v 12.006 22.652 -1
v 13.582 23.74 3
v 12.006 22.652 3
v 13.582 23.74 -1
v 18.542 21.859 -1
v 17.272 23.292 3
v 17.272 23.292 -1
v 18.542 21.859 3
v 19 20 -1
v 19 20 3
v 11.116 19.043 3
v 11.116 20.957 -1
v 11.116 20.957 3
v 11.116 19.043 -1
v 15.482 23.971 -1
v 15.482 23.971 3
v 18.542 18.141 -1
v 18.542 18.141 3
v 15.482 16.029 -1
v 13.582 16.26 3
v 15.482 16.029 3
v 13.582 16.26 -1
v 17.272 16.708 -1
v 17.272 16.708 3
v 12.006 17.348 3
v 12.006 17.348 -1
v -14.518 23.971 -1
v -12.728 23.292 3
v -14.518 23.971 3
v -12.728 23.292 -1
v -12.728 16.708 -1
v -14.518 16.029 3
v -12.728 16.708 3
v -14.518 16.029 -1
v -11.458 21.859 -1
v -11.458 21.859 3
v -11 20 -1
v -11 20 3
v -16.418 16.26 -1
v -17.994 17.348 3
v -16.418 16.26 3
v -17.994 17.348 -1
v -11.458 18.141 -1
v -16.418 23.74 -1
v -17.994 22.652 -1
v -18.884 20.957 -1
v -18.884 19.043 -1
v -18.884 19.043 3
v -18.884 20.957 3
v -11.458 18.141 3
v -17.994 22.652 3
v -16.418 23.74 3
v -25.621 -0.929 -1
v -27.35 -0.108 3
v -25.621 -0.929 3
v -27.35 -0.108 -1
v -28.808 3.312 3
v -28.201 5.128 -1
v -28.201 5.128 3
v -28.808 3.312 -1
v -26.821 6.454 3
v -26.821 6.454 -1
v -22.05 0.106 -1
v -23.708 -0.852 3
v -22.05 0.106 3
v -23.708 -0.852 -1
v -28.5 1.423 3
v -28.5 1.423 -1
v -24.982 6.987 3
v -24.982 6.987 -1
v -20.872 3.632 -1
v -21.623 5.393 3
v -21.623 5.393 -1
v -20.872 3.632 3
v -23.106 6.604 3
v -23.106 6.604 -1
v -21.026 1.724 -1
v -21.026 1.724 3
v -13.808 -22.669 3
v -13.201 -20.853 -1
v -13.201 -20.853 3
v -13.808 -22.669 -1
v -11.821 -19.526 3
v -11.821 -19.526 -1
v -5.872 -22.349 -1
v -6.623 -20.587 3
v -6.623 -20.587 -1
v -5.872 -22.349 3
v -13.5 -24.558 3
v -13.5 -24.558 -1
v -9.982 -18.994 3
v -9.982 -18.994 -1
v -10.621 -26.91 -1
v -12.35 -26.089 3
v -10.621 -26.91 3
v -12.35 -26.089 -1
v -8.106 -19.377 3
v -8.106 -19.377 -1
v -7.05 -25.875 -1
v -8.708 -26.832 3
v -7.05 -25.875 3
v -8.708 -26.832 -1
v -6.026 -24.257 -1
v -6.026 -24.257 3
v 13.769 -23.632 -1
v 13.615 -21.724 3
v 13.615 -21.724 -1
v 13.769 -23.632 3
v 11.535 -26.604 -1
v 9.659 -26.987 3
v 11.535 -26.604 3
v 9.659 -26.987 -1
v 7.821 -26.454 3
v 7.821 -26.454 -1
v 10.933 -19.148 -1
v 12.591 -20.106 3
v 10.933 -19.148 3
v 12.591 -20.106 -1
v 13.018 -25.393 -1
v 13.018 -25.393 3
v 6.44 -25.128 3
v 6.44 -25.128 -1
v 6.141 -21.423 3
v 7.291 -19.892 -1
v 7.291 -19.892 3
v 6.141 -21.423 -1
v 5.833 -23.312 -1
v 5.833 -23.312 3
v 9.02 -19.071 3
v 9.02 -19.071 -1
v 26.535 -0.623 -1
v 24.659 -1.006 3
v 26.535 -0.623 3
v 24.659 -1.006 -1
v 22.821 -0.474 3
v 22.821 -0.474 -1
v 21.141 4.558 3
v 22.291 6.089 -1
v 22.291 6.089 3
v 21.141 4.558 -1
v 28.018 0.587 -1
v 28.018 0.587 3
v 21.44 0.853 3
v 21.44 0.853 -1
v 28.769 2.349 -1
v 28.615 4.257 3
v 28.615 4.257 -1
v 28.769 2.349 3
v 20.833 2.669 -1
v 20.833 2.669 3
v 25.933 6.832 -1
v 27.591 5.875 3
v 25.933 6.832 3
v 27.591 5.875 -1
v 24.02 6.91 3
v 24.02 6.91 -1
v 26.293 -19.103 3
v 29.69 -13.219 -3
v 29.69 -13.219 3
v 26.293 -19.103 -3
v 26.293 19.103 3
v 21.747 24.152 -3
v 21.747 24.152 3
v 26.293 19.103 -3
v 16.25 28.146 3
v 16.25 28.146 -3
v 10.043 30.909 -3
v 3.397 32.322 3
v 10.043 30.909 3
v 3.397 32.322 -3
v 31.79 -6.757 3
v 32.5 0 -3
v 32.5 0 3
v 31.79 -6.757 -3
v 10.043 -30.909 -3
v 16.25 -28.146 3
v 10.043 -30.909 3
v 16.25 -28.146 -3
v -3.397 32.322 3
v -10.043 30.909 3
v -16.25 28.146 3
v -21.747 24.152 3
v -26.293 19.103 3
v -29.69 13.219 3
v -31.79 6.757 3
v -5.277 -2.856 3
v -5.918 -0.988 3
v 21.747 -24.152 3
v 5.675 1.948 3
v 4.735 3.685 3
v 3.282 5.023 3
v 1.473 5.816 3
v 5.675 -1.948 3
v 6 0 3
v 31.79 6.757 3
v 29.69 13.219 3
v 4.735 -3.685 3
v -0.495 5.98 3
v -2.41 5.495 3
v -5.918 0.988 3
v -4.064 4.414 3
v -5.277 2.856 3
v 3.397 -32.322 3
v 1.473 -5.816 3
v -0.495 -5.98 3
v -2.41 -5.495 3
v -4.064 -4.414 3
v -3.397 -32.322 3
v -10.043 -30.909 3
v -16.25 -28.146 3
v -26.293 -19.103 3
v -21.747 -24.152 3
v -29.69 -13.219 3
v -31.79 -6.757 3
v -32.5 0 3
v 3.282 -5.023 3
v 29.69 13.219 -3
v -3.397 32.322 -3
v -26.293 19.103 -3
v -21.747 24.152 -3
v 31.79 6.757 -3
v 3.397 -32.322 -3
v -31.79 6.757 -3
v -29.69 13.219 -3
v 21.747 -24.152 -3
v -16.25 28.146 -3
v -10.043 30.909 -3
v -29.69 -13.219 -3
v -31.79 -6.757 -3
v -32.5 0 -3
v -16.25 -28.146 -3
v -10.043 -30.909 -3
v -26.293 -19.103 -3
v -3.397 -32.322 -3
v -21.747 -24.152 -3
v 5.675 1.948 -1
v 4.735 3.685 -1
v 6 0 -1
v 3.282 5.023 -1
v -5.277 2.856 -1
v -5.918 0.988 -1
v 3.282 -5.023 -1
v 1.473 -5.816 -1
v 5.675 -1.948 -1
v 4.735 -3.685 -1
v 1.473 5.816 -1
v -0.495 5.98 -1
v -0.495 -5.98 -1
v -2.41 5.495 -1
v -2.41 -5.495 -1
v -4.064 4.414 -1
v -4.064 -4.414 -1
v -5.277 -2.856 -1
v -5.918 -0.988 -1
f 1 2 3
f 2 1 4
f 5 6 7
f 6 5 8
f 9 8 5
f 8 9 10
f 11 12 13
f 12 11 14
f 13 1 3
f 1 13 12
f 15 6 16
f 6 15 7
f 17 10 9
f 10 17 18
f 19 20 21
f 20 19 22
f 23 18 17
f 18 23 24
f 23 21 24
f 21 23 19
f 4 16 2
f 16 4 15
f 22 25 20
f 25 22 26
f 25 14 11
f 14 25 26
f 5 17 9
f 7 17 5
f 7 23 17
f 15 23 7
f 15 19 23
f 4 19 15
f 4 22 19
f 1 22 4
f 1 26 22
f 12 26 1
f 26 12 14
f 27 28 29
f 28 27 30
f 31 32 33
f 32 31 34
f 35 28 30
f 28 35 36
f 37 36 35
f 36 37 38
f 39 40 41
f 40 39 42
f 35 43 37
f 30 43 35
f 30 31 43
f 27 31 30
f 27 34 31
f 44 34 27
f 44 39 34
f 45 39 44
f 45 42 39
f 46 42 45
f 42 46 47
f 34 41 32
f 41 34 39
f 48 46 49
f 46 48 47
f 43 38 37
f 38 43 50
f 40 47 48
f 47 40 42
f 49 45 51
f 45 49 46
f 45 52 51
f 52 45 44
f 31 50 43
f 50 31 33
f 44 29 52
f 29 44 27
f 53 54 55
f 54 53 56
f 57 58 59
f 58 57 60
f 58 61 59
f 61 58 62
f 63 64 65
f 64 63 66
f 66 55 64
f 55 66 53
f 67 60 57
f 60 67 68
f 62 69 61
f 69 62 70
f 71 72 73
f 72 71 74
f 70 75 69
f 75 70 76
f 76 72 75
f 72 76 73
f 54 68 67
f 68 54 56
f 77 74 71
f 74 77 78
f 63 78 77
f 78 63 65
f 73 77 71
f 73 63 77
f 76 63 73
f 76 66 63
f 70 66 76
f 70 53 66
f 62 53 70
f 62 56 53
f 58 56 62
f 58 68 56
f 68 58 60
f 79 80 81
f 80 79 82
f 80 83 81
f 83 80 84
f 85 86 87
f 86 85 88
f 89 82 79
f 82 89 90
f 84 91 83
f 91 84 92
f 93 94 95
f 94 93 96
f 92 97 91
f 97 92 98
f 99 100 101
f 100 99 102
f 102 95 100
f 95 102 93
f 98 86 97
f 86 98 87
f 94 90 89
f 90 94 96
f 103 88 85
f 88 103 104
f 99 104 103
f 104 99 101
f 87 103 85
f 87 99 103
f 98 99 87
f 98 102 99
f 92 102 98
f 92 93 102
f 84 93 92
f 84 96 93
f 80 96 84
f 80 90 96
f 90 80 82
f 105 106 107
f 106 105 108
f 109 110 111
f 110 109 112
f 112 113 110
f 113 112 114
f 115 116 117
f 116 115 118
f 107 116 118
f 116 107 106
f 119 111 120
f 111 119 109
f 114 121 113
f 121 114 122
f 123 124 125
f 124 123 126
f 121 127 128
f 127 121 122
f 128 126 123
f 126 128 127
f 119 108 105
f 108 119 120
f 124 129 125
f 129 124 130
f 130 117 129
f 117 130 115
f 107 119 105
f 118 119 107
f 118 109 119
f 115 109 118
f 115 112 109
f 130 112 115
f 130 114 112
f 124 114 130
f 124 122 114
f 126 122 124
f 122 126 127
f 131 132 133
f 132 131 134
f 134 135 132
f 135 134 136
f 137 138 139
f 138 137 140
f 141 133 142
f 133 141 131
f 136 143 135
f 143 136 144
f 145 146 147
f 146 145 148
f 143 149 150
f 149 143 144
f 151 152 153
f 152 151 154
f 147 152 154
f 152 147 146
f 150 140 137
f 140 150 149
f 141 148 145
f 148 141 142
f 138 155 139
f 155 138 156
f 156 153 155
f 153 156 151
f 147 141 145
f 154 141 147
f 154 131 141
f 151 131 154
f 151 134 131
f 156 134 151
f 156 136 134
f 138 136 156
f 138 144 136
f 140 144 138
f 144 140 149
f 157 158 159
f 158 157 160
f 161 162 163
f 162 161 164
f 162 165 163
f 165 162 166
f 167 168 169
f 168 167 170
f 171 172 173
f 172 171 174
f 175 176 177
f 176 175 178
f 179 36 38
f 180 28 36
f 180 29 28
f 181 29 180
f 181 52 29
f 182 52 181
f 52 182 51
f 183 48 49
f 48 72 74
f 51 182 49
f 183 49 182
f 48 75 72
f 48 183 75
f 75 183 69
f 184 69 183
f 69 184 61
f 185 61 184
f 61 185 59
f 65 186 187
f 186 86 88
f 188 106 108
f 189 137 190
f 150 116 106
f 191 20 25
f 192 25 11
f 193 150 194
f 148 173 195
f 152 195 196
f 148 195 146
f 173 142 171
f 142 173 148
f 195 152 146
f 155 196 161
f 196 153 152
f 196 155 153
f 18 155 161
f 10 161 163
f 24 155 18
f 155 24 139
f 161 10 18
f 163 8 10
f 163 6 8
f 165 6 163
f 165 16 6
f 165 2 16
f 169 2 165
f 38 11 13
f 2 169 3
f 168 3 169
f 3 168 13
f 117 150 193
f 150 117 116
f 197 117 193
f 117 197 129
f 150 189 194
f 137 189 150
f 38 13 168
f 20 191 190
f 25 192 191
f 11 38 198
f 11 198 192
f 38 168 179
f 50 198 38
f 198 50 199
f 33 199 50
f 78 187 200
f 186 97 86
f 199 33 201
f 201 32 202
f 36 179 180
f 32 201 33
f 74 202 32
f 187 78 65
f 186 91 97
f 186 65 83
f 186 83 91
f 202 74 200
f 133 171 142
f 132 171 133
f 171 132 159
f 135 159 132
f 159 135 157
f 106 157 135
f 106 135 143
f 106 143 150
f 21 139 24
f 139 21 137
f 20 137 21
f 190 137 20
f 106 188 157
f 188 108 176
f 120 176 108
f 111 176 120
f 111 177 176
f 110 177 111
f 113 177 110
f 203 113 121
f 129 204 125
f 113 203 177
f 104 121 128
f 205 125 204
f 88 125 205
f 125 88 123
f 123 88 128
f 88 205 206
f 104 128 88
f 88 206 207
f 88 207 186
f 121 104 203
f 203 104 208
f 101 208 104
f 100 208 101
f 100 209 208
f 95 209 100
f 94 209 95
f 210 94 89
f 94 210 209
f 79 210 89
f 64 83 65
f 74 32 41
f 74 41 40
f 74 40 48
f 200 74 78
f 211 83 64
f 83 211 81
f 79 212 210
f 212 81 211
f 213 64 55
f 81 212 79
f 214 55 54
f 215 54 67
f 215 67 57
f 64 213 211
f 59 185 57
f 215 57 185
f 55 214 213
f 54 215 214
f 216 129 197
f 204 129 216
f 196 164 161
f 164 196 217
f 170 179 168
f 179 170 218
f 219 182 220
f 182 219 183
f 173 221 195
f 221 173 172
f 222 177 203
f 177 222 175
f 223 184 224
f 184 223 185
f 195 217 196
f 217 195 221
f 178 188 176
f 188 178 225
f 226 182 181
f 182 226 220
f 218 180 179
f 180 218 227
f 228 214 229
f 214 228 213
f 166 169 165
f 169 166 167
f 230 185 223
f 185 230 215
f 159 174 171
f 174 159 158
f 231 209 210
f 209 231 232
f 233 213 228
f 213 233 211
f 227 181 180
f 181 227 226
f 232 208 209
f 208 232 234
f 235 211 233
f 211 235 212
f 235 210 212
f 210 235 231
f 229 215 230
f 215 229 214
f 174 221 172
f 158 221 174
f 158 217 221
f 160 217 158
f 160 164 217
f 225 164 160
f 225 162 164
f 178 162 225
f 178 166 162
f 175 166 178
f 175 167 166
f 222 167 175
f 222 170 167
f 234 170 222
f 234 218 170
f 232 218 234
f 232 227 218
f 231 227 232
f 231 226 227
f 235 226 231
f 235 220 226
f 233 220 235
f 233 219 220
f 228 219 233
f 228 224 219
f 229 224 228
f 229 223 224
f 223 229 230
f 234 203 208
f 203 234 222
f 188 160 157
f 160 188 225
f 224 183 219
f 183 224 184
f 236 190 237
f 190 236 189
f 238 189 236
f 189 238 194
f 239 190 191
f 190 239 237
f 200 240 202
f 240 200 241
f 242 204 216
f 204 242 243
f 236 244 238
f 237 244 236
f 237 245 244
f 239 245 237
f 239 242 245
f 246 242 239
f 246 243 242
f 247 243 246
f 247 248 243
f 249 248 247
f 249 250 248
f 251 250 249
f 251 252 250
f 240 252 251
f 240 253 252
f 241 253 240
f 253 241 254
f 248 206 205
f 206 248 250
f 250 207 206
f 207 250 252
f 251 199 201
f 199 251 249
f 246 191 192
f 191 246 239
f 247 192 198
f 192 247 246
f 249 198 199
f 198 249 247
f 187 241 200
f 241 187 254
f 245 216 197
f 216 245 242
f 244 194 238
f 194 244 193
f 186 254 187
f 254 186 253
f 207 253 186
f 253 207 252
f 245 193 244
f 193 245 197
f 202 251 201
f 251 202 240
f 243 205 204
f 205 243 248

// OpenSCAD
center_hole_diameter = 12;
bolt_diameter = 8;
material_thickness=6;
parallelogram_width=30;
distance_from_center=-20;


module bolt_pair() {
	translate([parallelogram_width/2,-distance_from_center,-1])
		cylinder(d=bolt_diameter,h=material_thickness+2);
	translate([-parallelogram_width/2,-distance_from_center,-1])
		cylinder(d=bolt_diameter,h=material_thickness+2);

}

module bolt_triangle() {
	bolt_pair();
	rotate(120)
		bolt_pair();
	rotate(-120)
		bolt_pair();
}





module effector() {
	difference() {
		cylinder(d=65,h=material_thickness,center=true);
		translate([0,0,-1])
			cylinder(d=center_hole_diameter,h=material_thickness+2);
		bolt_triangle();
	}
}

effector();
